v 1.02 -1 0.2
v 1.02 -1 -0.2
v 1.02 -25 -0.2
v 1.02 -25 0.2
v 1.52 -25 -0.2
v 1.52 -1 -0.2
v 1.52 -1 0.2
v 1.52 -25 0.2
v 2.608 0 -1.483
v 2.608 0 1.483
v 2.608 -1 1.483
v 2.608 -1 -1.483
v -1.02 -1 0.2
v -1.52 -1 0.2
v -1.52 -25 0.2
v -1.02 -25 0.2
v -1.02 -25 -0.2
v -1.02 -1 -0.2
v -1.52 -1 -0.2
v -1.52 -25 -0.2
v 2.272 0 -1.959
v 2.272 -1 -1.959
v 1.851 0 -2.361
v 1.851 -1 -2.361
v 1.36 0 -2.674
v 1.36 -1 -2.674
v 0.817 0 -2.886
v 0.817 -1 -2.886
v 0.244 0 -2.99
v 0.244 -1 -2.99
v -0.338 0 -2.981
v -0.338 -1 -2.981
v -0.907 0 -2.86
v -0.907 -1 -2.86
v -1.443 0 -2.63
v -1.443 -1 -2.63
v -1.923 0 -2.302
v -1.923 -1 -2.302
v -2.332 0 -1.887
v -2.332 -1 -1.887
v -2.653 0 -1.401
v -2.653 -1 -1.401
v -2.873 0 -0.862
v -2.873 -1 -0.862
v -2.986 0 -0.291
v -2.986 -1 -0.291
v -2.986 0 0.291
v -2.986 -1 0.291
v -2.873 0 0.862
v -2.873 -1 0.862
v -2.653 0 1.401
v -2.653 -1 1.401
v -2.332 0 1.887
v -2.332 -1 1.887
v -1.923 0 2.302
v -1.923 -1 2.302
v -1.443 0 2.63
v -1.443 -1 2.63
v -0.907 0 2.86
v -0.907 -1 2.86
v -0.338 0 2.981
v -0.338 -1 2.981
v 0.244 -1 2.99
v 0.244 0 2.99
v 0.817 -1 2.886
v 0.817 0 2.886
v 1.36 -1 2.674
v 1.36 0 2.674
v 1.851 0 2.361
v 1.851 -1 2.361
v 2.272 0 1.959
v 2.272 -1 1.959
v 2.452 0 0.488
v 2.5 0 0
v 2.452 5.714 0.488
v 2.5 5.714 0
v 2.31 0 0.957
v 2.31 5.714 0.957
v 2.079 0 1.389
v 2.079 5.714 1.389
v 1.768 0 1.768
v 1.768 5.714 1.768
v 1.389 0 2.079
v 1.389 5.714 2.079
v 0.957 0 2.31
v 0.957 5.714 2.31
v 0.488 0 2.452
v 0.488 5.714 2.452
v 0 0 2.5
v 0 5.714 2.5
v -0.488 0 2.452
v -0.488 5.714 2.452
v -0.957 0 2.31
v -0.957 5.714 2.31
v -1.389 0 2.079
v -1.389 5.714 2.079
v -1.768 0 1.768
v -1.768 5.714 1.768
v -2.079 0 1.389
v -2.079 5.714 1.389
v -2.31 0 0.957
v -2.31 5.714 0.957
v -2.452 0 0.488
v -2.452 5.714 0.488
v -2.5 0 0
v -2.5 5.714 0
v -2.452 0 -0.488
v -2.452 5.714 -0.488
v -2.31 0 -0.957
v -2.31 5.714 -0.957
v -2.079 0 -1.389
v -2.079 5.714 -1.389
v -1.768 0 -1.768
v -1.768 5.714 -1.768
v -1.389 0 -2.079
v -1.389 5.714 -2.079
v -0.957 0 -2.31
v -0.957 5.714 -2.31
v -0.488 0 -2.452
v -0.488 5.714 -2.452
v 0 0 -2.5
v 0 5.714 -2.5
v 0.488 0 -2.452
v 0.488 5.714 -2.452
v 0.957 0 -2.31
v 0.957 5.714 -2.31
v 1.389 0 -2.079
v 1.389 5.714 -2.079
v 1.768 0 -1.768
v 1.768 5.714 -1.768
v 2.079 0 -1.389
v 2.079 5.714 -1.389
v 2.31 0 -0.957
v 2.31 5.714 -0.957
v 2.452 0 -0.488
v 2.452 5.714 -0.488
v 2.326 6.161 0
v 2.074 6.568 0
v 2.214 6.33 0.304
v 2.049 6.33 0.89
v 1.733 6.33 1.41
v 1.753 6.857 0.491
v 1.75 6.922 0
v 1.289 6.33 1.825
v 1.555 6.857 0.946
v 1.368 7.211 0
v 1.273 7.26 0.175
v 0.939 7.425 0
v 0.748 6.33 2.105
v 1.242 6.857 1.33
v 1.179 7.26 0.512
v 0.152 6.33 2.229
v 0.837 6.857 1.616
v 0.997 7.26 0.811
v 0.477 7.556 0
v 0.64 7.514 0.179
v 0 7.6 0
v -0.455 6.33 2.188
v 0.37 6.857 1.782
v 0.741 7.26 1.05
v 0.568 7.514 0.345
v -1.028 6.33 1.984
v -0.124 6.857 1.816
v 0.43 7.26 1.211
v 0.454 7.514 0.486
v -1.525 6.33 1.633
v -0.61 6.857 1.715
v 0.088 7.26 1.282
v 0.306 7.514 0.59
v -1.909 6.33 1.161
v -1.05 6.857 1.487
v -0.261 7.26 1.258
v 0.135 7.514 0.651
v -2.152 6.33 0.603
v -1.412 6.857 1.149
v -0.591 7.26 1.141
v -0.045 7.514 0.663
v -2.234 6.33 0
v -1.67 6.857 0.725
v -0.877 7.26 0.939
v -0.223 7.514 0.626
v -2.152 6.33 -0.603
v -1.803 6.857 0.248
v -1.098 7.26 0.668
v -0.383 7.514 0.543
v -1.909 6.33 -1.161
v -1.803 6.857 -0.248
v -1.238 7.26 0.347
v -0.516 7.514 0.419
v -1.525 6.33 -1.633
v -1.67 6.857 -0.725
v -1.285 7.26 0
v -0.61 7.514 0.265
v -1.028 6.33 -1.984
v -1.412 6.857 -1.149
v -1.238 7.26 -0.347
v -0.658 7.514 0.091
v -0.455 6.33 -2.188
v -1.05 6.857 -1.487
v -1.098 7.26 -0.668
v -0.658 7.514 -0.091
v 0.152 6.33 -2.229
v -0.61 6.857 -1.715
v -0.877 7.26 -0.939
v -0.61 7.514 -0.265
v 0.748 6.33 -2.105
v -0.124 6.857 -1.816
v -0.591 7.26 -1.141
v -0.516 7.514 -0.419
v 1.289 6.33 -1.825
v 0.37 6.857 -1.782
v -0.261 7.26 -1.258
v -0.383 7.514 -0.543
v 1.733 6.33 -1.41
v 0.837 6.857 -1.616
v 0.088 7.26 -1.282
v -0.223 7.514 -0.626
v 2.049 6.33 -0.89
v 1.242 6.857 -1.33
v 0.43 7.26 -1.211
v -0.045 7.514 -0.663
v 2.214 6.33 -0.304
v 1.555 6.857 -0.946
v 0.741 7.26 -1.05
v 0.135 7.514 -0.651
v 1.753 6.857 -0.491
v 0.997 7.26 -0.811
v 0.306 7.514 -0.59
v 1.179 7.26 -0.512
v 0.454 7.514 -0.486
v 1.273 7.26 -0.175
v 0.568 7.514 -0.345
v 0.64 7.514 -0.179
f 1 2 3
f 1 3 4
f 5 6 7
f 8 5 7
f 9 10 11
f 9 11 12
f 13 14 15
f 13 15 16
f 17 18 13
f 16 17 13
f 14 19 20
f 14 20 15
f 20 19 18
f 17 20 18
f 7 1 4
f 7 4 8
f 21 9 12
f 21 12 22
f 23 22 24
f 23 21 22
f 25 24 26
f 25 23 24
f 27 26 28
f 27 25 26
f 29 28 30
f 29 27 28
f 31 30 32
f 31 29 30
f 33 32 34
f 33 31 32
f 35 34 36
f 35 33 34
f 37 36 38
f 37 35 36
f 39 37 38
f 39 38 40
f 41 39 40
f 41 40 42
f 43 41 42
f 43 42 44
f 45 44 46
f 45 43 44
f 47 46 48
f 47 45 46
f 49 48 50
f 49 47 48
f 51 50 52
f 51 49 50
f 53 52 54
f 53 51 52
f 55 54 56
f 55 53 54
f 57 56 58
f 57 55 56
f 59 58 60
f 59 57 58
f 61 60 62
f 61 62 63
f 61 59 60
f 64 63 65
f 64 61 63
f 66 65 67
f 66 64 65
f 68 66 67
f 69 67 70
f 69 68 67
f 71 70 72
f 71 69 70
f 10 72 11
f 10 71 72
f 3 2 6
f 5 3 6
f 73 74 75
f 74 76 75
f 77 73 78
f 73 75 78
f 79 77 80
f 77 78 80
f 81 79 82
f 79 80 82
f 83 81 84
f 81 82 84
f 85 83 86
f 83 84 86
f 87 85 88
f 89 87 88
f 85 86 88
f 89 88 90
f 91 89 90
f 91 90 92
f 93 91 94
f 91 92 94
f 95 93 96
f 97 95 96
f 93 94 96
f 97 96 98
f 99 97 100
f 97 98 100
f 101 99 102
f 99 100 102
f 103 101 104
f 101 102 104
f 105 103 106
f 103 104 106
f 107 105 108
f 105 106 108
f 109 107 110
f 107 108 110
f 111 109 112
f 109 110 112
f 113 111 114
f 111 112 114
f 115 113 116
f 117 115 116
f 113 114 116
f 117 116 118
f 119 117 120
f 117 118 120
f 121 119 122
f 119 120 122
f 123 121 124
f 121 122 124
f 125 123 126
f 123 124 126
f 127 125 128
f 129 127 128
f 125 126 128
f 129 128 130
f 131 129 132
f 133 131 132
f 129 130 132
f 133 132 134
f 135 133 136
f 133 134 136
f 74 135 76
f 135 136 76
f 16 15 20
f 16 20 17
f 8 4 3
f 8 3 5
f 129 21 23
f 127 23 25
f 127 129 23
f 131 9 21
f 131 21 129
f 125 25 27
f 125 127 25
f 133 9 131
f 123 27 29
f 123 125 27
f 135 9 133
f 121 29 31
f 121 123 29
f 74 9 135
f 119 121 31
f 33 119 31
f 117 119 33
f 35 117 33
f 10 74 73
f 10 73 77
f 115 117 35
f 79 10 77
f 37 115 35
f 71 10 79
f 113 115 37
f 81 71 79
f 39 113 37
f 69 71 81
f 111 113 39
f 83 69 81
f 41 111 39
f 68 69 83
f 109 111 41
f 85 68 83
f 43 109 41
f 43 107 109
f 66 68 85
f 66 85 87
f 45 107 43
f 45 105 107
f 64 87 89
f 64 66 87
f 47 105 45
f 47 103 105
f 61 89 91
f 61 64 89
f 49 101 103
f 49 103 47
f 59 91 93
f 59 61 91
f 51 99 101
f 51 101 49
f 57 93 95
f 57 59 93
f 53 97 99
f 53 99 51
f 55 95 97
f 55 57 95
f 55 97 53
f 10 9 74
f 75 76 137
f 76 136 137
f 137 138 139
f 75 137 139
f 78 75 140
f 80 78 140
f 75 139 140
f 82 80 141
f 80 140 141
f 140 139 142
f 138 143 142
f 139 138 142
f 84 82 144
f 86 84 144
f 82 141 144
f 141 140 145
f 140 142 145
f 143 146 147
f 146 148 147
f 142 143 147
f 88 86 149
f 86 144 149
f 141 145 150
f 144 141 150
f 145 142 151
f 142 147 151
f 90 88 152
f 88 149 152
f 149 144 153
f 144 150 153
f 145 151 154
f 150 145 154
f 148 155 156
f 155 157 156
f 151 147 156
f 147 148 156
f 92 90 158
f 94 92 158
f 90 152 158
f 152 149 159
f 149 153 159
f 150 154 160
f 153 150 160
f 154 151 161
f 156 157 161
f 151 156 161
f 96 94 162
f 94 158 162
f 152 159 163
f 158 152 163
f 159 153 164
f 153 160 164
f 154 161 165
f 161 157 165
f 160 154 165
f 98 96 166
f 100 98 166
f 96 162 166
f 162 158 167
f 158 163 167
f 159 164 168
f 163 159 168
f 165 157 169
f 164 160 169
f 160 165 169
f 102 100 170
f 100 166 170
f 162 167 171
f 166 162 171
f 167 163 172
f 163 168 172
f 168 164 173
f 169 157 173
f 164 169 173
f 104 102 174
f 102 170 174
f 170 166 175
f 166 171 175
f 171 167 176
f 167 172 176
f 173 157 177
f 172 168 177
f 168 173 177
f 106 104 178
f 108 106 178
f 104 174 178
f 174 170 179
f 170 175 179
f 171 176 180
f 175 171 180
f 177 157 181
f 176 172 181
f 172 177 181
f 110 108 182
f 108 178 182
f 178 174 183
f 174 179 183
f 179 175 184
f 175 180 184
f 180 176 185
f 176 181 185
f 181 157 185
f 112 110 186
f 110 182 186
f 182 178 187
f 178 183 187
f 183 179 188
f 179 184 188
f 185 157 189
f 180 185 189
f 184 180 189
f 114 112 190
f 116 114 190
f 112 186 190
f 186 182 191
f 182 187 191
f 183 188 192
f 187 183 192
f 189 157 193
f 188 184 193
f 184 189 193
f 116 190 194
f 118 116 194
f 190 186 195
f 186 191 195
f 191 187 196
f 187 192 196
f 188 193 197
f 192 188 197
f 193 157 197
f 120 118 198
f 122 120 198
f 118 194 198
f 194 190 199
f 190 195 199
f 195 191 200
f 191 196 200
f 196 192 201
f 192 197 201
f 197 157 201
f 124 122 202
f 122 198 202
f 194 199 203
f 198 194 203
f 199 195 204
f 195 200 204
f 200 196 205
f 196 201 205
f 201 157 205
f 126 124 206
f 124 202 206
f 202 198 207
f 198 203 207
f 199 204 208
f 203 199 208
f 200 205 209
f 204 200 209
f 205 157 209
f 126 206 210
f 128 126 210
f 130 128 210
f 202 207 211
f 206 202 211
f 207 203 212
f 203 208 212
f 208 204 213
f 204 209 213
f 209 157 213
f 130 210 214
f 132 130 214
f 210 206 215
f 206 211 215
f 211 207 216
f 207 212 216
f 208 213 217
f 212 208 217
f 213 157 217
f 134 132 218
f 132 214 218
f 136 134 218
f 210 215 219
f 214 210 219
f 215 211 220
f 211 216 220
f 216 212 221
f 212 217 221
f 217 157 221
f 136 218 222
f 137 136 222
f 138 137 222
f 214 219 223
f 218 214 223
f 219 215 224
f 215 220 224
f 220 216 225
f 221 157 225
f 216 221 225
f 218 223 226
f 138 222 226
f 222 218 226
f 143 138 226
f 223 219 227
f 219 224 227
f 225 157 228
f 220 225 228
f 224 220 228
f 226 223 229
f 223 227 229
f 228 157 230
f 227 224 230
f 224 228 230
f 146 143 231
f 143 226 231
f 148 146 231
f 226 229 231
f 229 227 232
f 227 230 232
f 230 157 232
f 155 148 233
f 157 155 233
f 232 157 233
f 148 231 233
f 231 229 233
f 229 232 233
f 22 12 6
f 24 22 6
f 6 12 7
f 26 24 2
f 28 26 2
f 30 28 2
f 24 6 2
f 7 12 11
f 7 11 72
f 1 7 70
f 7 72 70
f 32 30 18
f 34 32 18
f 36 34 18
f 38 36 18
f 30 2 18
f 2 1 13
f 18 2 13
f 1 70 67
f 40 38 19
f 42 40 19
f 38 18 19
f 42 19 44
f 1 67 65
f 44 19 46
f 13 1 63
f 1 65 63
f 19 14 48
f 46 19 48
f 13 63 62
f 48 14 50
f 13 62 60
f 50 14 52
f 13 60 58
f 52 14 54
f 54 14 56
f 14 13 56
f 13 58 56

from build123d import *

# Parameters (mm, degrees)
SALIENTE_EXTRUIR2_DEPTH = 1
CROQUIS3_W              = 0.5
CROQUIS3_H              = 0.4
SALIENTE_EXTRUIR3_DEPTH = 24


with BuildPart() as part:
    # Croquis1 → Revolución1 (revolve)
    with BuildSketch(Plane.XY):
        with BuildLine():
            Line((0, 0), (2.5, 0))
            Line((2.5, 0), (2.5, 5.714142843))
            ThreePointArc((2.5, 5.714142843), (1.56576317, 7.075665121), (0, 7.6))
            Line((0, 7.6), (0, 0))
        make_face()
    revolve(axis=Axis((0, 7.6, 0), (0, -1, 0)))

    # Croquis2 → Saliente-Extruir2 (add)
    with BuildSketch(Plane.XZ):
        with BuildLine():
            Line((2.607539428, 1.483488501), (2.607539428, -1.483488501))
            ThreePointArc((2.607539428, -1.483488501), (-3, 0), (2.607539428, 1.483488501))
        make_face()
    extrude(amount=SALIENTE_EXTRUIR2_DEPTH)

    # Croquis3 → Saliente-Extruir3 (add)
    with BuildSketch(Plane.XZ.offset(1)):
        with Locations((1.27, 0)):
            Rectangle(CROQUIS3_W, CROQUIS3_H)
        with Locations((-1.27, 0)):
            Rectangle(CROQUIS3_W, CROQUIS3_H)
    extrude(amount=SALIENTE_EXTRUIR3_DEPTH)


solid = part.part
